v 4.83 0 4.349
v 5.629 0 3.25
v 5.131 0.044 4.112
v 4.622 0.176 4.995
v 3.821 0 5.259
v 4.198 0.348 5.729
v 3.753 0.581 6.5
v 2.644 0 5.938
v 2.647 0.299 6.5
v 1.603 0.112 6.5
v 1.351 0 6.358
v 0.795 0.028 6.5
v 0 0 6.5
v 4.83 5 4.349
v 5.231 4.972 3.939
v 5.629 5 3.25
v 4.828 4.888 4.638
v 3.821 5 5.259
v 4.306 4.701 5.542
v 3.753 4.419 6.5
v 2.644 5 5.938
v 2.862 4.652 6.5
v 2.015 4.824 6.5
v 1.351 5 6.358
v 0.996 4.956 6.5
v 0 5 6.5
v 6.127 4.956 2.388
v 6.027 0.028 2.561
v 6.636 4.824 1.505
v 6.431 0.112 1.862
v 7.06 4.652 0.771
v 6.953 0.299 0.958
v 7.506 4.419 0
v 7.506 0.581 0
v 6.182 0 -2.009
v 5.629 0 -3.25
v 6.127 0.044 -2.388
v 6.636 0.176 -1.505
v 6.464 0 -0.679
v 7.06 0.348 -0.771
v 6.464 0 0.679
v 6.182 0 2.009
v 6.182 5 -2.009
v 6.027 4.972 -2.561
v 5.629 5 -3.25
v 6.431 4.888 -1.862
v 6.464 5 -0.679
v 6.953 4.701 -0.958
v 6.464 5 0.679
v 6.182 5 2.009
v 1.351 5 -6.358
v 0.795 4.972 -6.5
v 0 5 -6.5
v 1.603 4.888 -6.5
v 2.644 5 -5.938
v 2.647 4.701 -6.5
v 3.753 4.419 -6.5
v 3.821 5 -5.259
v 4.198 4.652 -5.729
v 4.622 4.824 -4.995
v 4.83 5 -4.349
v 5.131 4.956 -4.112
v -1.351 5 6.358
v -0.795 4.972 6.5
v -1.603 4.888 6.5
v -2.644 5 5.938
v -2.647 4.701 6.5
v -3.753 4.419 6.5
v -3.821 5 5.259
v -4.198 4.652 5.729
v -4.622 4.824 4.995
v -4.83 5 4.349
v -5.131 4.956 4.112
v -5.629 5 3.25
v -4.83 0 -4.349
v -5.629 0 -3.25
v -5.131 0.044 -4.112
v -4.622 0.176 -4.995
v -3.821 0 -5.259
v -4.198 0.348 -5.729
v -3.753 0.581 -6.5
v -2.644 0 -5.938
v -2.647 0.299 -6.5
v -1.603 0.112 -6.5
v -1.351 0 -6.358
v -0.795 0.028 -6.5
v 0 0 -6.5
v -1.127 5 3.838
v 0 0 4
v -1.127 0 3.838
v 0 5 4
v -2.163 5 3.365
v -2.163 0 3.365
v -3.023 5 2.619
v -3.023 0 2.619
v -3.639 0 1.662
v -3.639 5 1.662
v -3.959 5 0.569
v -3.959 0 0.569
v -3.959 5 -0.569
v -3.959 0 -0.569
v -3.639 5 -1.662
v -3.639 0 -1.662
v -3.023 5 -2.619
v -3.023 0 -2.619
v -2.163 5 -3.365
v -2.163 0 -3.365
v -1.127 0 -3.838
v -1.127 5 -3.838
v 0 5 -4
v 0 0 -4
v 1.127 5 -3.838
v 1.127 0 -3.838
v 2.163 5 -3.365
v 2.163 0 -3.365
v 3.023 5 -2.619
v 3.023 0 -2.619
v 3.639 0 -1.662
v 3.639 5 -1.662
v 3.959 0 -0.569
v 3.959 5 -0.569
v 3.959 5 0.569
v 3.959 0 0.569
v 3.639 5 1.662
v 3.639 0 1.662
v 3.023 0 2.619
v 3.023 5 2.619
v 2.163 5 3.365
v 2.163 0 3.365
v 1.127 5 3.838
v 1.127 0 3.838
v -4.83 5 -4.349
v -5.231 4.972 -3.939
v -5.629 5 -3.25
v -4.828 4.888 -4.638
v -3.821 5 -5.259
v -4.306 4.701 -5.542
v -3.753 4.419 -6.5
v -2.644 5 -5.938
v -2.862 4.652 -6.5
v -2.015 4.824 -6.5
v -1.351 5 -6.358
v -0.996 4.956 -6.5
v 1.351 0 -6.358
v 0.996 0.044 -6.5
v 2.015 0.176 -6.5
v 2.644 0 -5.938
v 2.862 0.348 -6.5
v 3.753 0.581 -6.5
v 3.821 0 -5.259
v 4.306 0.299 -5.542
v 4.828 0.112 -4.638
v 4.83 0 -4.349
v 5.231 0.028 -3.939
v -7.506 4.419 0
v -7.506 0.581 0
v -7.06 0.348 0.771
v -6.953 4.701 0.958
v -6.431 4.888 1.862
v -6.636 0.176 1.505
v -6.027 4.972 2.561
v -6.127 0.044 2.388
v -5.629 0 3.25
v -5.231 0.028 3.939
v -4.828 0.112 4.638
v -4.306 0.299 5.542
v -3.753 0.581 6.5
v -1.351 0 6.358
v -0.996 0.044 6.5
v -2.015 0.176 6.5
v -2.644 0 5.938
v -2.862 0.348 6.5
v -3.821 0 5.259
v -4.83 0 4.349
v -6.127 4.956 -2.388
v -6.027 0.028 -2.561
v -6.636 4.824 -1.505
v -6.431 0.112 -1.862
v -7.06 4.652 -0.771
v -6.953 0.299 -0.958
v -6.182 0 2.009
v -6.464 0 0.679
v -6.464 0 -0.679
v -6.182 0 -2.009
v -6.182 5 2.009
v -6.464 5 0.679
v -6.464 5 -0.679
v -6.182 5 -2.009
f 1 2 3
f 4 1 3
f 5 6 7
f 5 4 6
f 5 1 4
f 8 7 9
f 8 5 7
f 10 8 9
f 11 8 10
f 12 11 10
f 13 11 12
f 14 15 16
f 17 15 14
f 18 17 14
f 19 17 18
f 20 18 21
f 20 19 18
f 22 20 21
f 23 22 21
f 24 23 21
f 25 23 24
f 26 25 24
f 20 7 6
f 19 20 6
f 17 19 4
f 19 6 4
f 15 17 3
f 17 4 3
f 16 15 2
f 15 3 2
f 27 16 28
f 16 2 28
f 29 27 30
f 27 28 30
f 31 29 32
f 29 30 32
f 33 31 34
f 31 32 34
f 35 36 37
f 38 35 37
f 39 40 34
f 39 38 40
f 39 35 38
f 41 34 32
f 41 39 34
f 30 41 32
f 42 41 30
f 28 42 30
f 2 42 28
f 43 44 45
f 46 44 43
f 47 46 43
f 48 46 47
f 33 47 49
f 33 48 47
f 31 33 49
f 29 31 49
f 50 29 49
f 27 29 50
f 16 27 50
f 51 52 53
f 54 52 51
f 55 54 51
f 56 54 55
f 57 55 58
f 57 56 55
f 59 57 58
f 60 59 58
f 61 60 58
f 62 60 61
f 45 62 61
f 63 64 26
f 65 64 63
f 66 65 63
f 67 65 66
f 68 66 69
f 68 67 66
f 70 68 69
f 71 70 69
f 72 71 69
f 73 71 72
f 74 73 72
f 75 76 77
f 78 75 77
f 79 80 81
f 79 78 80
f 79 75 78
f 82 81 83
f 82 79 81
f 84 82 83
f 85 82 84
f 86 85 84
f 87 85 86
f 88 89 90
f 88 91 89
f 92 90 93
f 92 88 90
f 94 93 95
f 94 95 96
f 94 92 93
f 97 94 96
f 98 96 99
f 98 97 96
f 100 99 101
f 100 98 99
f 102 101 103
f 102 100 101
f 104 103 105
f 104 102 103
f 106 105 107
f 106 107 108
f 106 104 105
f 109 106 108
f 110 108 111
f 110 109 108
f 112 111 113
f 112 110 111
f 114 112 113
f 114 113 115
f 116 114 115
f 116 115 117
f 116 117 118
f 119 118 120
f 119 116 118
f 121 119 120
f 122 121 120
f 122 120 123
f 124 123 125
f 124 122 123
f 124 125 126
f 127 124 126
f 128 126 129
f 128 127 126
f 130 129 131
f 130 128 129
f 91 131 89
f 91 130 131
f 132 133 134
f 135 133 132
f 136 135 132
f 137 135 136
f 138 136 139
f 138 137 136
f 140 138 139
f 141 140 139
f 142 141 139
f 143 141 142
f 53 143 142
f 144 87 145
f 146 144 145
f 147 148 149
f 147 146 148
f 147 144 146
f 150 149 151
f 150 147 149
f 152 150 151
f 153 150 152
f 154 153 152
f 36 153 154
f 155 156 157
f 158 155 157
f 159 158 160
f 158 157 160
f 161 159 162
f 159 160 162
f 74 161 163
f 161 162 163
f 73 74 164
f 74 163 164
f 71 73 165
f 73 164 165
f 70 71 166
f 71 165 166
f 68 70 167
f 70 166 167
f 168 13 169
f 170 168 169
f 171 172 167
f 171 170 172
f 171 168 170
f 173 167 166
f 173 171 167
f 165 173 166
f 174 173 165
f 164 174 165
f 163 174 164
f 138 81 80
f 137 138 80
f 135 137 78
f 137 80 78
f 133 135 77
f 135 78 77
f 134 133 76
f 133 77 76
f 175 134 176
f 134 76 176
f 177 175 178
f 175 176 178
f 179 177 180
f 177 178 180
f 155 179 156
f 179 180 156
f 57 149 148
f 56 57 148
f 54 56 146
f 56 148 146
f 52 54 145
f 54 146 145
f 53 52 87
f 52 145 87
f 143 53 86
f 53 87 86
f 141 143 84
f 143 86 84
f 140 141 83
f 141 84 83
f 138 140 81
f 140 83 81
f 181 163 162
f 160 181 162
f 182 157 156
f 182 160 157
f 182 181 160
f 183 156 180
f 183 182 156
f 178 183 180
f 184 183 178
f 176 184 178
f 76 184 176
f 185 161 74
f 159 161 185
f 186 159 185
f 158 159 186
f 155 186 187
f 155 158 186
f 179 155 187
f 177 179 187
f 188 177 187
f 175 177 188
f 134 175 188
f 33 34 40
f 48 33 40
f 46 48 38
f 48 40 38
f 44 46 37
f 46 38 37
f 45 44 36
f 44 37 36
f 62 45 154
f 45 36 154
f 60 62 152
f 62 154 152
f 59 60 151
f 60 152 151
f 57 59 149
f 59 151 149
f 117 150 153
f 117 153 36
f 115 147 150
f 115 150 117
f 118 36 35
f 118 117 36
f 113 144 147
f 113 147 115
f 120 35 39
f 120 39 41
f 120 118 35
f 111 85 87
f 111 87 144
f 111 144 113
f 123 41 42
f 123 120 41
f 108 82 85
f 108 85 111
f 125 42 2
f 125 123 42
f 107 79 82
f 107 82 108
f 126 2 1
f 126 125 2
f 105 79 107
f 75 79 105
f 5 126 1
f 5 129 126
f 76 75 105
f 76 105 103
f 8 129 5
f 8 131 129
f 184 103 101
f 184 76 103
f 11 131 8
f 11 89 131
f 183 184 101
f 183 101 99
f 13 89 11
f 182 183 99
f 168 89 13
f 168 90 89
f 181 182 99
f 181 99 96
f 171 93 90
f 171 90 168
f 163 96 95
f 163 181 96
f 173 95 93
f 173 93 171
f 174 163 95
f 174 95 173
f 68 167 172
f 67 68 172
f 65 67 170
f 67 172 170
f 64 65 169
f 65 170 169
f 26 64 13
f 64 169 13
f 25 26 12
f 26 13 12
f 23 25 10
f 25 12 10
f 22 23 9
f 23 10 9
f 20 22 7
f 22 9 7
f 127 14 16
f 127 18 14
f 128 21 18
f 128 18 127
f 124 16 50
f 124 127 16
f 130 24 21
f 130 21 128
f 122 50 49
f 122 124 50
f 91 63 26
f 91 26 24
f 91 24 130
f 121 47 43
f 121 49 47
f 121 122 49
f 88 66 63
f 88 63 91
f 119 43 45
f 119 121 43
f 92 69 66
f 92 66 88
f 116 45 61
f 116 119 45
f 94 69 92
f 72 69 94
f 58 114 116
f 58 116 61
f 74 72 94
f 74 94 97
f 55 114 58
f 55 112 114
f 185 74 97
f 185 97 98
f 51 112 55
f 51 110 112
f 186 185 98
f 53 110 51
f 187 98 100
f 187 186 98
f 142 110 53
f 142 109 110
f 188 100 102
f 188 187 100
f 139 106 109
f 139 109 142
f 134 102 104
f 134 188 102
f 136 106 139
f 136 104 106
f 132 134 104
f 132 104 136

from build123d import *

# Parameters (mm, degrees)
ESQUISSE2_OUTSIDE_W     = 25.68
ESQUISSE2_OUTSIDE_H     = 25.68
ENL_V_MAT_EXTRU_1_DEPTH = 5


with BuildPart() as part:
    # Esquisse1 → Base-Révolution (revolve)
    with BuildSketch(Plane.XY, mode=Mode.PRIVATE) as base_r_volution_sk:
        Polygon((4, 5), (6.5, 5), (9.192388155, 3.445548946), (9.192388155, 1.554451054), (6.5, 0), (4, 0), align=None)
    revolve(base_r_volution_sk.sketch.rotate(Axis((0, 2.4, 0), (0, -1, 0)), 90), axis=Axis((0, 2.4, 0), (0, -1, 0)))  # turned: the seam where the file's is

    # Esquisse2 outside → Enlèv. mat.-Extru.1 (cut)
    with BuildSketch(Plane(origin=(0, 0, 0), x_dir=(1, 0, 0), z_dir=(0, 1, 0))):
        Rectangle(ESQUISSE2_OUTSIDE_W, ESQUISSE2_OUTSIDE_H)
        Polygon((-3.75277675, -6.5), (3.75277675, -6.5), (7.505553499, 0), (3.75277675, 6.5), (-3.75277675, 6.5), (-7.505553499, 0), align=None, mode=Mode.SUBTRACT)
    extrude(amount=ENL_V_MAT_EXTRU_1_DEPTH, mode=Mode.SUBTRACT)


solid = part.part
